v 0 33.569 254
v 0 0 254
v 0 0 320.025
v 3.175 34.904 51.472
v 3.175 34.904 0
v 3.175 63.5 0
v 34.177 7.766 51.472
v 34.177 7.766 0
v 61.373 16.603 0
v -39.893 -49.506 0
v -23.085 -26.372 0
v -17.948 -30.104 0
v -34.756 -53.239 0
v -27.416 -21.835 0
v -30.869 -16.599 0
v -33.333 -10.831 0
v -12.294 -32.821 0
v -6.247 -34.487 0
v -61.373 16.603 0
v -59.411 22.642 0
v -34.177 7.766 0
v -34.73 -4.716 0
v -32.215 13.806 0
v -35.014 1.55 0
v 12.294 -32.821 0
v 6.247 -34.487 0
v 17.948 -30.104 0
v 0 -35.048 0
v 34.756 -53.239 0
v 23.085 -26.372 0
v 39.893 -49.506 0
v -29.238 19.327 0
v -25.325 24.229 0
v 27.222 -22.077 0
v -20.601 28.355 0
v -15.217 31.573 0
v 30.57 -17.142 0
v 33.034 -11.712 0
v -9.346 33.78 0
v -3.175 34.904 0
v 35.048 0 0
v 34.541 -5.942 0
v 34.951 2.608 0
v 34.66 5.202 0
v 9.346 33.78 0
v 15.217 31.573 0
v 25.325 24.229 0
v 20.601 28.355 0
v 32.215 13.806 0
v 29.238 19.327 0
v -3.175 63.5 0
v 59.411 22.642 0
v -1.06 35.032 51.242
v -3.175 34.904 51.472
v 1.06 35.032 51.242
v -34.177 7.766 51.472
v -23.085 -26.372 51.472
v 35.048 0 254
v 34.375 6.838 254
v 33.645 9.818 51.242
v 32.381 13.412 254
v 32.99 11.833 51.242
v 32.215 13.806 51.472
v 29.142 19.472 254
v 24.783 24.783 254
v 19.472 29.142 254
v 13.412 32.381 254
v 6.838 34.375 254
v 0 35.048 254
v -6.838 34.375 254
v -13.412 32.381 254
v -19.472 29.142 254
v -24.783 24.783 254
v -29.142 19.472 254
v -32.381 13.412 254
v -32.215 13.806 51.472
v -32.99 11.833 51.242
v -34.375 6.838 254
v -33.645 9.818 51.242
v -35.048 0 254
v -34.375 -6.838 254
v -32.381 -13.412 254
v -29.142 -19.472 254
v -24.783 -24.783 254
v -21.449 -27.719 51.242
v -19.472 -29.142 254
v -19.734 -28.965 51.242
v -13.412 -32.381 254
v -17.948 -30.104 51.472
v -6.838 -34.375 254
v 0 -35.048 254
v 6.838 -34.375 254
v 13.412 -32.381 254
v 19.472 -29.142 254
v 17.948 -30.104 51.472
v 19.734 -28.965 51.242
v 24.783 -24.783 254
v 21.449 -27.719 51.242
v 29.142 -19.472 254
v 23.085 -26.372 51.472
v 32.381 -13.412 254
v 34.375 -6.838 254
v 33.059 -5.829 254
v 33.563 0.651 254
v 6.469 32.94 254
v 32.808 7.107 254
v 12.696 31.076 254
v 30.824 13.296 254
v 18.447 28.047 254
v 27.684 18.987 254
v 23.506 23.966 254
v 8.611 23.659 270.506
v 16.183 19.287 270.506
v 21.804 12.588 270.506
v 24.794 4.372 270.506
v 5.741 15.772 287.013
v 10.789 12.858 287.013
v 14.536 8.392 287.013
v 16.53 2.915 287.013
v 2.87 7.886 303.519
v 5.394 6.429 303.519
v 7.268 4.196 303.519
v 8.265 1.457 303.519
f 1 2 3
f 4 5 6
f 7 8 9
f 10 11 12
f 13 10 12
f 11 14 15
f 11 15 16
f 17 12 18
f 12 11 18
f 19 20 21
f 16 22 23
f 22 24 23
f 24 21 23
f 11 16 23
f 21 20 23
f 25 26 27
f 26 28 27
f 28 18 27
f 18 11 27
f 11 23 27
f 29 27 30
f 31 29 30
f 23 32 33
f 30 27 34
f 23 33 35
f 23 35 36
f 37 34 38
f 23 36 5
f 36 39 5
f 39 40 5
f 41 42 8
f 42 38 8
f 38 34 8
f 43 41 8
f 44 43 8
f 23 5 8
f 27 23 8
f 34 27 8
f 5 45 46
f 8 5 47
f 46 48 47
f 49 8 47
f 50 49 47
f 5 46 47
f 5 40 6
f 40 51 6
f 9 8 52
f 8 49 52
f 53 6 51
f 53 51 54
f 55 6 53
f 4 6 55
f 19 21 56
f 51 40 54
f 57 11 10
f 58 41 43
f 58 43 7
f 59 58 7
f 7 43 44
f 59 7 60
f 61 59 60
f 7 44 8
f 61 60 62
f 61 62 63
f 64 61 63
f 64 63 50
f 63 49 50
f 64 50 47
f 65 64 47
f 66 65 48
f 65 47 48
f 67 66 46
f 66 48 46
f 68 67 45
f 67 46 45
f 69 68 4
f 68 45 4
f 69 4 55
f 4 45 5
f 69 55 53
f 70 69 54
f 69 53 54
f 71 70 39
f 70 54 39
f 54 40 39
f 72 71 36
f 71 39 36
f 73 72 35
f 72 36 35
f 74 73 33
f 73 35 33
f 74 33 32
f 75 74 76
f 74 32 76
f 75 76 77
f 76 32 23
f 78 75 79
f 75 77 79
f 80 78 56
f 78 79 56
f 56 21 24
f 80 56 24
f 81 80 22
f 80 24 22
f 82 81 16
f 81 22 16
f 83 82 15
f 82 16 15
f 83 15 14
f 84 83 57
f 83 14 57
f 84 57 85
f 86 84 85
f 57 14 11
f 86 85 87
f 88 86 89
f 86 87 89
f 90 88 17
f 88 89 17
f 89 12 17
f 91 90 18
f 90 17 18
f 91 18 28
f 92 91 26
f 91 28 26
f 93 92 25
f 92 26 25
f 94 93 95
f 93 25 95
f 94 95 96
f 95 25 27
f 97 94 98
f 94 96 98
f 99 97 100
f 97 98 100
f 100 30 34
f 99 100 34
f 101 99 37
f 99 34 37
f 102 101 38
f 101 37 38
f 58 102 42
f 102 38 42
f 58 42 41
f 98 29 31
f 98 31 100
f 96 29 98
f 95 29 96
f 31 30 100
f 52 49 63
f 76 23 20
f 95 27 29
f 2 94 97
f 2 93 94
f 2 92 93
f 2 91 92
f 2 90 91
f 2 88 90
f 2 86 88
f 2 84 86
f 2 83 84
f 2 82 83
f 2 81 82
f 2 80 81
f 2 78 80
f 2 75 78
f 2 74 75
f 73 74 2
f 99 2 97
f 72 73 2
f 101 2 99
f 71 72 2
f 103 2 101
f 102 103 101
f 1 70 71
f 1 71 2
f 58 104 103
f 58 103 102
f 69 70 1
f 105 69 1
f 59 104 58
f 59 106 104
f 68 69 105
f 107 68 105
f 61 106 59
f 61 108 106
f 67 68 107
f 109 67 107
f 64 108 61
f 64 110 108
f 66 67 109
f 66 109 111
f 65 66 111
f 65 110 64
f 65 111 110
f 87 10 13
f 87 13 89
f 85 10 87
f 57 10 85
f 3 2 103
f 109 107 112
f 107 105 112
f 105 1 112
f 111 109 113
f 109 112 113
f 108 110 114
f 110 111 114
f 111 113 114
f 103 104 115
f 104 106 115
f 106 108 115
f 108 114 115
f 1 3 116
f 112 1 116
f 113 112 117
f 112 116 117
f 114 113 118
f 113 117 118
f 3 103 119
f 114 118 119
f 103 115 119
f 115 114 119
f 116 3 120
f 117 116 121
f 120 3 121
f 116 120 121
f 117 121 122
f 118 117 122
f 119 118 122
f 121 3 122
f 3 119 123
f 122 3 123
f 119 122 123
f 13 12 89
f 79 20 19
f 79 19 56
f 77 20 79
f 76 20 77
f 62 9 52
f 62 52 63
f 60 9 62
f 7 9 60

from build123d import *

# Parameters (mm, degrees)
F0_R     = 35.048486
F1_DEPTH = 254
F3_DEPTH = 3.175
F4_COUNT = 5
F6_ANGLE = -100


with BuildPart() as f1:
    # F0 (on Top) → F1 (new body)
    with BuildSketch(Plane.XY):
        Circle(F0_R)
    extrude(amount=F1_DEPTH)

    # F2 (on Right) → F3 (join, symmetric)
    with BuildSketch(Plane.YZ):
        Polygon((0, 114.3), (0, 0), (63.5, 0), align=None)
    extrude(amount=F3_DEPTH, both=True)



with BuildPart() as f4_1:
    # F4: instance of F1
    add(f1.part.rotate(Axis((0, 0, 0), (0, 0, -1)), 1 * 360 / F4_COUNT))


with BuildPart() as f4_2:
    # F4: instance of F1
    add(f1.part.rotate(Axis((0, 0, 0), (0, 0, -1)), 2 * 360 / F4_COUNT))


with BuildPart() as f4_3:
    # F4: instance of F1
    add(f1.part.rotate(Axis((0, 0, 0), (0, 0, -1)), 3 * 360 / F4_COUNT))


with BuildPart() as f4_4:
    # F4: instance of F1
    add(f1.part.rotate(Axis((0, 0, 0), (0, 0, -1)), 4 * 360 / F4_COUNT))


with BuildPart() as f1_1:
    add(f1.part)

    add(f4_1.part)  # F6 merges F4_1

    add(f4_2.part)  # F6 merges F4_2

    add(f4_3.part)  # F6 merges F4_3

    add(f4_4.part)  # F6 merges F4_4
    # F5 (on Right) → F6 (revolve)
    with BuildSketch(Plane.YZ):
        Polygon((0, 320.025444), (0, 253.76758), (34.447256, 252.273053), align=None)
    revolve(axis=Axis((0, 0, 286.896512), (0, 0, 1)), revolution_arc=F6_ANGLE)


solid = f1_1.part
